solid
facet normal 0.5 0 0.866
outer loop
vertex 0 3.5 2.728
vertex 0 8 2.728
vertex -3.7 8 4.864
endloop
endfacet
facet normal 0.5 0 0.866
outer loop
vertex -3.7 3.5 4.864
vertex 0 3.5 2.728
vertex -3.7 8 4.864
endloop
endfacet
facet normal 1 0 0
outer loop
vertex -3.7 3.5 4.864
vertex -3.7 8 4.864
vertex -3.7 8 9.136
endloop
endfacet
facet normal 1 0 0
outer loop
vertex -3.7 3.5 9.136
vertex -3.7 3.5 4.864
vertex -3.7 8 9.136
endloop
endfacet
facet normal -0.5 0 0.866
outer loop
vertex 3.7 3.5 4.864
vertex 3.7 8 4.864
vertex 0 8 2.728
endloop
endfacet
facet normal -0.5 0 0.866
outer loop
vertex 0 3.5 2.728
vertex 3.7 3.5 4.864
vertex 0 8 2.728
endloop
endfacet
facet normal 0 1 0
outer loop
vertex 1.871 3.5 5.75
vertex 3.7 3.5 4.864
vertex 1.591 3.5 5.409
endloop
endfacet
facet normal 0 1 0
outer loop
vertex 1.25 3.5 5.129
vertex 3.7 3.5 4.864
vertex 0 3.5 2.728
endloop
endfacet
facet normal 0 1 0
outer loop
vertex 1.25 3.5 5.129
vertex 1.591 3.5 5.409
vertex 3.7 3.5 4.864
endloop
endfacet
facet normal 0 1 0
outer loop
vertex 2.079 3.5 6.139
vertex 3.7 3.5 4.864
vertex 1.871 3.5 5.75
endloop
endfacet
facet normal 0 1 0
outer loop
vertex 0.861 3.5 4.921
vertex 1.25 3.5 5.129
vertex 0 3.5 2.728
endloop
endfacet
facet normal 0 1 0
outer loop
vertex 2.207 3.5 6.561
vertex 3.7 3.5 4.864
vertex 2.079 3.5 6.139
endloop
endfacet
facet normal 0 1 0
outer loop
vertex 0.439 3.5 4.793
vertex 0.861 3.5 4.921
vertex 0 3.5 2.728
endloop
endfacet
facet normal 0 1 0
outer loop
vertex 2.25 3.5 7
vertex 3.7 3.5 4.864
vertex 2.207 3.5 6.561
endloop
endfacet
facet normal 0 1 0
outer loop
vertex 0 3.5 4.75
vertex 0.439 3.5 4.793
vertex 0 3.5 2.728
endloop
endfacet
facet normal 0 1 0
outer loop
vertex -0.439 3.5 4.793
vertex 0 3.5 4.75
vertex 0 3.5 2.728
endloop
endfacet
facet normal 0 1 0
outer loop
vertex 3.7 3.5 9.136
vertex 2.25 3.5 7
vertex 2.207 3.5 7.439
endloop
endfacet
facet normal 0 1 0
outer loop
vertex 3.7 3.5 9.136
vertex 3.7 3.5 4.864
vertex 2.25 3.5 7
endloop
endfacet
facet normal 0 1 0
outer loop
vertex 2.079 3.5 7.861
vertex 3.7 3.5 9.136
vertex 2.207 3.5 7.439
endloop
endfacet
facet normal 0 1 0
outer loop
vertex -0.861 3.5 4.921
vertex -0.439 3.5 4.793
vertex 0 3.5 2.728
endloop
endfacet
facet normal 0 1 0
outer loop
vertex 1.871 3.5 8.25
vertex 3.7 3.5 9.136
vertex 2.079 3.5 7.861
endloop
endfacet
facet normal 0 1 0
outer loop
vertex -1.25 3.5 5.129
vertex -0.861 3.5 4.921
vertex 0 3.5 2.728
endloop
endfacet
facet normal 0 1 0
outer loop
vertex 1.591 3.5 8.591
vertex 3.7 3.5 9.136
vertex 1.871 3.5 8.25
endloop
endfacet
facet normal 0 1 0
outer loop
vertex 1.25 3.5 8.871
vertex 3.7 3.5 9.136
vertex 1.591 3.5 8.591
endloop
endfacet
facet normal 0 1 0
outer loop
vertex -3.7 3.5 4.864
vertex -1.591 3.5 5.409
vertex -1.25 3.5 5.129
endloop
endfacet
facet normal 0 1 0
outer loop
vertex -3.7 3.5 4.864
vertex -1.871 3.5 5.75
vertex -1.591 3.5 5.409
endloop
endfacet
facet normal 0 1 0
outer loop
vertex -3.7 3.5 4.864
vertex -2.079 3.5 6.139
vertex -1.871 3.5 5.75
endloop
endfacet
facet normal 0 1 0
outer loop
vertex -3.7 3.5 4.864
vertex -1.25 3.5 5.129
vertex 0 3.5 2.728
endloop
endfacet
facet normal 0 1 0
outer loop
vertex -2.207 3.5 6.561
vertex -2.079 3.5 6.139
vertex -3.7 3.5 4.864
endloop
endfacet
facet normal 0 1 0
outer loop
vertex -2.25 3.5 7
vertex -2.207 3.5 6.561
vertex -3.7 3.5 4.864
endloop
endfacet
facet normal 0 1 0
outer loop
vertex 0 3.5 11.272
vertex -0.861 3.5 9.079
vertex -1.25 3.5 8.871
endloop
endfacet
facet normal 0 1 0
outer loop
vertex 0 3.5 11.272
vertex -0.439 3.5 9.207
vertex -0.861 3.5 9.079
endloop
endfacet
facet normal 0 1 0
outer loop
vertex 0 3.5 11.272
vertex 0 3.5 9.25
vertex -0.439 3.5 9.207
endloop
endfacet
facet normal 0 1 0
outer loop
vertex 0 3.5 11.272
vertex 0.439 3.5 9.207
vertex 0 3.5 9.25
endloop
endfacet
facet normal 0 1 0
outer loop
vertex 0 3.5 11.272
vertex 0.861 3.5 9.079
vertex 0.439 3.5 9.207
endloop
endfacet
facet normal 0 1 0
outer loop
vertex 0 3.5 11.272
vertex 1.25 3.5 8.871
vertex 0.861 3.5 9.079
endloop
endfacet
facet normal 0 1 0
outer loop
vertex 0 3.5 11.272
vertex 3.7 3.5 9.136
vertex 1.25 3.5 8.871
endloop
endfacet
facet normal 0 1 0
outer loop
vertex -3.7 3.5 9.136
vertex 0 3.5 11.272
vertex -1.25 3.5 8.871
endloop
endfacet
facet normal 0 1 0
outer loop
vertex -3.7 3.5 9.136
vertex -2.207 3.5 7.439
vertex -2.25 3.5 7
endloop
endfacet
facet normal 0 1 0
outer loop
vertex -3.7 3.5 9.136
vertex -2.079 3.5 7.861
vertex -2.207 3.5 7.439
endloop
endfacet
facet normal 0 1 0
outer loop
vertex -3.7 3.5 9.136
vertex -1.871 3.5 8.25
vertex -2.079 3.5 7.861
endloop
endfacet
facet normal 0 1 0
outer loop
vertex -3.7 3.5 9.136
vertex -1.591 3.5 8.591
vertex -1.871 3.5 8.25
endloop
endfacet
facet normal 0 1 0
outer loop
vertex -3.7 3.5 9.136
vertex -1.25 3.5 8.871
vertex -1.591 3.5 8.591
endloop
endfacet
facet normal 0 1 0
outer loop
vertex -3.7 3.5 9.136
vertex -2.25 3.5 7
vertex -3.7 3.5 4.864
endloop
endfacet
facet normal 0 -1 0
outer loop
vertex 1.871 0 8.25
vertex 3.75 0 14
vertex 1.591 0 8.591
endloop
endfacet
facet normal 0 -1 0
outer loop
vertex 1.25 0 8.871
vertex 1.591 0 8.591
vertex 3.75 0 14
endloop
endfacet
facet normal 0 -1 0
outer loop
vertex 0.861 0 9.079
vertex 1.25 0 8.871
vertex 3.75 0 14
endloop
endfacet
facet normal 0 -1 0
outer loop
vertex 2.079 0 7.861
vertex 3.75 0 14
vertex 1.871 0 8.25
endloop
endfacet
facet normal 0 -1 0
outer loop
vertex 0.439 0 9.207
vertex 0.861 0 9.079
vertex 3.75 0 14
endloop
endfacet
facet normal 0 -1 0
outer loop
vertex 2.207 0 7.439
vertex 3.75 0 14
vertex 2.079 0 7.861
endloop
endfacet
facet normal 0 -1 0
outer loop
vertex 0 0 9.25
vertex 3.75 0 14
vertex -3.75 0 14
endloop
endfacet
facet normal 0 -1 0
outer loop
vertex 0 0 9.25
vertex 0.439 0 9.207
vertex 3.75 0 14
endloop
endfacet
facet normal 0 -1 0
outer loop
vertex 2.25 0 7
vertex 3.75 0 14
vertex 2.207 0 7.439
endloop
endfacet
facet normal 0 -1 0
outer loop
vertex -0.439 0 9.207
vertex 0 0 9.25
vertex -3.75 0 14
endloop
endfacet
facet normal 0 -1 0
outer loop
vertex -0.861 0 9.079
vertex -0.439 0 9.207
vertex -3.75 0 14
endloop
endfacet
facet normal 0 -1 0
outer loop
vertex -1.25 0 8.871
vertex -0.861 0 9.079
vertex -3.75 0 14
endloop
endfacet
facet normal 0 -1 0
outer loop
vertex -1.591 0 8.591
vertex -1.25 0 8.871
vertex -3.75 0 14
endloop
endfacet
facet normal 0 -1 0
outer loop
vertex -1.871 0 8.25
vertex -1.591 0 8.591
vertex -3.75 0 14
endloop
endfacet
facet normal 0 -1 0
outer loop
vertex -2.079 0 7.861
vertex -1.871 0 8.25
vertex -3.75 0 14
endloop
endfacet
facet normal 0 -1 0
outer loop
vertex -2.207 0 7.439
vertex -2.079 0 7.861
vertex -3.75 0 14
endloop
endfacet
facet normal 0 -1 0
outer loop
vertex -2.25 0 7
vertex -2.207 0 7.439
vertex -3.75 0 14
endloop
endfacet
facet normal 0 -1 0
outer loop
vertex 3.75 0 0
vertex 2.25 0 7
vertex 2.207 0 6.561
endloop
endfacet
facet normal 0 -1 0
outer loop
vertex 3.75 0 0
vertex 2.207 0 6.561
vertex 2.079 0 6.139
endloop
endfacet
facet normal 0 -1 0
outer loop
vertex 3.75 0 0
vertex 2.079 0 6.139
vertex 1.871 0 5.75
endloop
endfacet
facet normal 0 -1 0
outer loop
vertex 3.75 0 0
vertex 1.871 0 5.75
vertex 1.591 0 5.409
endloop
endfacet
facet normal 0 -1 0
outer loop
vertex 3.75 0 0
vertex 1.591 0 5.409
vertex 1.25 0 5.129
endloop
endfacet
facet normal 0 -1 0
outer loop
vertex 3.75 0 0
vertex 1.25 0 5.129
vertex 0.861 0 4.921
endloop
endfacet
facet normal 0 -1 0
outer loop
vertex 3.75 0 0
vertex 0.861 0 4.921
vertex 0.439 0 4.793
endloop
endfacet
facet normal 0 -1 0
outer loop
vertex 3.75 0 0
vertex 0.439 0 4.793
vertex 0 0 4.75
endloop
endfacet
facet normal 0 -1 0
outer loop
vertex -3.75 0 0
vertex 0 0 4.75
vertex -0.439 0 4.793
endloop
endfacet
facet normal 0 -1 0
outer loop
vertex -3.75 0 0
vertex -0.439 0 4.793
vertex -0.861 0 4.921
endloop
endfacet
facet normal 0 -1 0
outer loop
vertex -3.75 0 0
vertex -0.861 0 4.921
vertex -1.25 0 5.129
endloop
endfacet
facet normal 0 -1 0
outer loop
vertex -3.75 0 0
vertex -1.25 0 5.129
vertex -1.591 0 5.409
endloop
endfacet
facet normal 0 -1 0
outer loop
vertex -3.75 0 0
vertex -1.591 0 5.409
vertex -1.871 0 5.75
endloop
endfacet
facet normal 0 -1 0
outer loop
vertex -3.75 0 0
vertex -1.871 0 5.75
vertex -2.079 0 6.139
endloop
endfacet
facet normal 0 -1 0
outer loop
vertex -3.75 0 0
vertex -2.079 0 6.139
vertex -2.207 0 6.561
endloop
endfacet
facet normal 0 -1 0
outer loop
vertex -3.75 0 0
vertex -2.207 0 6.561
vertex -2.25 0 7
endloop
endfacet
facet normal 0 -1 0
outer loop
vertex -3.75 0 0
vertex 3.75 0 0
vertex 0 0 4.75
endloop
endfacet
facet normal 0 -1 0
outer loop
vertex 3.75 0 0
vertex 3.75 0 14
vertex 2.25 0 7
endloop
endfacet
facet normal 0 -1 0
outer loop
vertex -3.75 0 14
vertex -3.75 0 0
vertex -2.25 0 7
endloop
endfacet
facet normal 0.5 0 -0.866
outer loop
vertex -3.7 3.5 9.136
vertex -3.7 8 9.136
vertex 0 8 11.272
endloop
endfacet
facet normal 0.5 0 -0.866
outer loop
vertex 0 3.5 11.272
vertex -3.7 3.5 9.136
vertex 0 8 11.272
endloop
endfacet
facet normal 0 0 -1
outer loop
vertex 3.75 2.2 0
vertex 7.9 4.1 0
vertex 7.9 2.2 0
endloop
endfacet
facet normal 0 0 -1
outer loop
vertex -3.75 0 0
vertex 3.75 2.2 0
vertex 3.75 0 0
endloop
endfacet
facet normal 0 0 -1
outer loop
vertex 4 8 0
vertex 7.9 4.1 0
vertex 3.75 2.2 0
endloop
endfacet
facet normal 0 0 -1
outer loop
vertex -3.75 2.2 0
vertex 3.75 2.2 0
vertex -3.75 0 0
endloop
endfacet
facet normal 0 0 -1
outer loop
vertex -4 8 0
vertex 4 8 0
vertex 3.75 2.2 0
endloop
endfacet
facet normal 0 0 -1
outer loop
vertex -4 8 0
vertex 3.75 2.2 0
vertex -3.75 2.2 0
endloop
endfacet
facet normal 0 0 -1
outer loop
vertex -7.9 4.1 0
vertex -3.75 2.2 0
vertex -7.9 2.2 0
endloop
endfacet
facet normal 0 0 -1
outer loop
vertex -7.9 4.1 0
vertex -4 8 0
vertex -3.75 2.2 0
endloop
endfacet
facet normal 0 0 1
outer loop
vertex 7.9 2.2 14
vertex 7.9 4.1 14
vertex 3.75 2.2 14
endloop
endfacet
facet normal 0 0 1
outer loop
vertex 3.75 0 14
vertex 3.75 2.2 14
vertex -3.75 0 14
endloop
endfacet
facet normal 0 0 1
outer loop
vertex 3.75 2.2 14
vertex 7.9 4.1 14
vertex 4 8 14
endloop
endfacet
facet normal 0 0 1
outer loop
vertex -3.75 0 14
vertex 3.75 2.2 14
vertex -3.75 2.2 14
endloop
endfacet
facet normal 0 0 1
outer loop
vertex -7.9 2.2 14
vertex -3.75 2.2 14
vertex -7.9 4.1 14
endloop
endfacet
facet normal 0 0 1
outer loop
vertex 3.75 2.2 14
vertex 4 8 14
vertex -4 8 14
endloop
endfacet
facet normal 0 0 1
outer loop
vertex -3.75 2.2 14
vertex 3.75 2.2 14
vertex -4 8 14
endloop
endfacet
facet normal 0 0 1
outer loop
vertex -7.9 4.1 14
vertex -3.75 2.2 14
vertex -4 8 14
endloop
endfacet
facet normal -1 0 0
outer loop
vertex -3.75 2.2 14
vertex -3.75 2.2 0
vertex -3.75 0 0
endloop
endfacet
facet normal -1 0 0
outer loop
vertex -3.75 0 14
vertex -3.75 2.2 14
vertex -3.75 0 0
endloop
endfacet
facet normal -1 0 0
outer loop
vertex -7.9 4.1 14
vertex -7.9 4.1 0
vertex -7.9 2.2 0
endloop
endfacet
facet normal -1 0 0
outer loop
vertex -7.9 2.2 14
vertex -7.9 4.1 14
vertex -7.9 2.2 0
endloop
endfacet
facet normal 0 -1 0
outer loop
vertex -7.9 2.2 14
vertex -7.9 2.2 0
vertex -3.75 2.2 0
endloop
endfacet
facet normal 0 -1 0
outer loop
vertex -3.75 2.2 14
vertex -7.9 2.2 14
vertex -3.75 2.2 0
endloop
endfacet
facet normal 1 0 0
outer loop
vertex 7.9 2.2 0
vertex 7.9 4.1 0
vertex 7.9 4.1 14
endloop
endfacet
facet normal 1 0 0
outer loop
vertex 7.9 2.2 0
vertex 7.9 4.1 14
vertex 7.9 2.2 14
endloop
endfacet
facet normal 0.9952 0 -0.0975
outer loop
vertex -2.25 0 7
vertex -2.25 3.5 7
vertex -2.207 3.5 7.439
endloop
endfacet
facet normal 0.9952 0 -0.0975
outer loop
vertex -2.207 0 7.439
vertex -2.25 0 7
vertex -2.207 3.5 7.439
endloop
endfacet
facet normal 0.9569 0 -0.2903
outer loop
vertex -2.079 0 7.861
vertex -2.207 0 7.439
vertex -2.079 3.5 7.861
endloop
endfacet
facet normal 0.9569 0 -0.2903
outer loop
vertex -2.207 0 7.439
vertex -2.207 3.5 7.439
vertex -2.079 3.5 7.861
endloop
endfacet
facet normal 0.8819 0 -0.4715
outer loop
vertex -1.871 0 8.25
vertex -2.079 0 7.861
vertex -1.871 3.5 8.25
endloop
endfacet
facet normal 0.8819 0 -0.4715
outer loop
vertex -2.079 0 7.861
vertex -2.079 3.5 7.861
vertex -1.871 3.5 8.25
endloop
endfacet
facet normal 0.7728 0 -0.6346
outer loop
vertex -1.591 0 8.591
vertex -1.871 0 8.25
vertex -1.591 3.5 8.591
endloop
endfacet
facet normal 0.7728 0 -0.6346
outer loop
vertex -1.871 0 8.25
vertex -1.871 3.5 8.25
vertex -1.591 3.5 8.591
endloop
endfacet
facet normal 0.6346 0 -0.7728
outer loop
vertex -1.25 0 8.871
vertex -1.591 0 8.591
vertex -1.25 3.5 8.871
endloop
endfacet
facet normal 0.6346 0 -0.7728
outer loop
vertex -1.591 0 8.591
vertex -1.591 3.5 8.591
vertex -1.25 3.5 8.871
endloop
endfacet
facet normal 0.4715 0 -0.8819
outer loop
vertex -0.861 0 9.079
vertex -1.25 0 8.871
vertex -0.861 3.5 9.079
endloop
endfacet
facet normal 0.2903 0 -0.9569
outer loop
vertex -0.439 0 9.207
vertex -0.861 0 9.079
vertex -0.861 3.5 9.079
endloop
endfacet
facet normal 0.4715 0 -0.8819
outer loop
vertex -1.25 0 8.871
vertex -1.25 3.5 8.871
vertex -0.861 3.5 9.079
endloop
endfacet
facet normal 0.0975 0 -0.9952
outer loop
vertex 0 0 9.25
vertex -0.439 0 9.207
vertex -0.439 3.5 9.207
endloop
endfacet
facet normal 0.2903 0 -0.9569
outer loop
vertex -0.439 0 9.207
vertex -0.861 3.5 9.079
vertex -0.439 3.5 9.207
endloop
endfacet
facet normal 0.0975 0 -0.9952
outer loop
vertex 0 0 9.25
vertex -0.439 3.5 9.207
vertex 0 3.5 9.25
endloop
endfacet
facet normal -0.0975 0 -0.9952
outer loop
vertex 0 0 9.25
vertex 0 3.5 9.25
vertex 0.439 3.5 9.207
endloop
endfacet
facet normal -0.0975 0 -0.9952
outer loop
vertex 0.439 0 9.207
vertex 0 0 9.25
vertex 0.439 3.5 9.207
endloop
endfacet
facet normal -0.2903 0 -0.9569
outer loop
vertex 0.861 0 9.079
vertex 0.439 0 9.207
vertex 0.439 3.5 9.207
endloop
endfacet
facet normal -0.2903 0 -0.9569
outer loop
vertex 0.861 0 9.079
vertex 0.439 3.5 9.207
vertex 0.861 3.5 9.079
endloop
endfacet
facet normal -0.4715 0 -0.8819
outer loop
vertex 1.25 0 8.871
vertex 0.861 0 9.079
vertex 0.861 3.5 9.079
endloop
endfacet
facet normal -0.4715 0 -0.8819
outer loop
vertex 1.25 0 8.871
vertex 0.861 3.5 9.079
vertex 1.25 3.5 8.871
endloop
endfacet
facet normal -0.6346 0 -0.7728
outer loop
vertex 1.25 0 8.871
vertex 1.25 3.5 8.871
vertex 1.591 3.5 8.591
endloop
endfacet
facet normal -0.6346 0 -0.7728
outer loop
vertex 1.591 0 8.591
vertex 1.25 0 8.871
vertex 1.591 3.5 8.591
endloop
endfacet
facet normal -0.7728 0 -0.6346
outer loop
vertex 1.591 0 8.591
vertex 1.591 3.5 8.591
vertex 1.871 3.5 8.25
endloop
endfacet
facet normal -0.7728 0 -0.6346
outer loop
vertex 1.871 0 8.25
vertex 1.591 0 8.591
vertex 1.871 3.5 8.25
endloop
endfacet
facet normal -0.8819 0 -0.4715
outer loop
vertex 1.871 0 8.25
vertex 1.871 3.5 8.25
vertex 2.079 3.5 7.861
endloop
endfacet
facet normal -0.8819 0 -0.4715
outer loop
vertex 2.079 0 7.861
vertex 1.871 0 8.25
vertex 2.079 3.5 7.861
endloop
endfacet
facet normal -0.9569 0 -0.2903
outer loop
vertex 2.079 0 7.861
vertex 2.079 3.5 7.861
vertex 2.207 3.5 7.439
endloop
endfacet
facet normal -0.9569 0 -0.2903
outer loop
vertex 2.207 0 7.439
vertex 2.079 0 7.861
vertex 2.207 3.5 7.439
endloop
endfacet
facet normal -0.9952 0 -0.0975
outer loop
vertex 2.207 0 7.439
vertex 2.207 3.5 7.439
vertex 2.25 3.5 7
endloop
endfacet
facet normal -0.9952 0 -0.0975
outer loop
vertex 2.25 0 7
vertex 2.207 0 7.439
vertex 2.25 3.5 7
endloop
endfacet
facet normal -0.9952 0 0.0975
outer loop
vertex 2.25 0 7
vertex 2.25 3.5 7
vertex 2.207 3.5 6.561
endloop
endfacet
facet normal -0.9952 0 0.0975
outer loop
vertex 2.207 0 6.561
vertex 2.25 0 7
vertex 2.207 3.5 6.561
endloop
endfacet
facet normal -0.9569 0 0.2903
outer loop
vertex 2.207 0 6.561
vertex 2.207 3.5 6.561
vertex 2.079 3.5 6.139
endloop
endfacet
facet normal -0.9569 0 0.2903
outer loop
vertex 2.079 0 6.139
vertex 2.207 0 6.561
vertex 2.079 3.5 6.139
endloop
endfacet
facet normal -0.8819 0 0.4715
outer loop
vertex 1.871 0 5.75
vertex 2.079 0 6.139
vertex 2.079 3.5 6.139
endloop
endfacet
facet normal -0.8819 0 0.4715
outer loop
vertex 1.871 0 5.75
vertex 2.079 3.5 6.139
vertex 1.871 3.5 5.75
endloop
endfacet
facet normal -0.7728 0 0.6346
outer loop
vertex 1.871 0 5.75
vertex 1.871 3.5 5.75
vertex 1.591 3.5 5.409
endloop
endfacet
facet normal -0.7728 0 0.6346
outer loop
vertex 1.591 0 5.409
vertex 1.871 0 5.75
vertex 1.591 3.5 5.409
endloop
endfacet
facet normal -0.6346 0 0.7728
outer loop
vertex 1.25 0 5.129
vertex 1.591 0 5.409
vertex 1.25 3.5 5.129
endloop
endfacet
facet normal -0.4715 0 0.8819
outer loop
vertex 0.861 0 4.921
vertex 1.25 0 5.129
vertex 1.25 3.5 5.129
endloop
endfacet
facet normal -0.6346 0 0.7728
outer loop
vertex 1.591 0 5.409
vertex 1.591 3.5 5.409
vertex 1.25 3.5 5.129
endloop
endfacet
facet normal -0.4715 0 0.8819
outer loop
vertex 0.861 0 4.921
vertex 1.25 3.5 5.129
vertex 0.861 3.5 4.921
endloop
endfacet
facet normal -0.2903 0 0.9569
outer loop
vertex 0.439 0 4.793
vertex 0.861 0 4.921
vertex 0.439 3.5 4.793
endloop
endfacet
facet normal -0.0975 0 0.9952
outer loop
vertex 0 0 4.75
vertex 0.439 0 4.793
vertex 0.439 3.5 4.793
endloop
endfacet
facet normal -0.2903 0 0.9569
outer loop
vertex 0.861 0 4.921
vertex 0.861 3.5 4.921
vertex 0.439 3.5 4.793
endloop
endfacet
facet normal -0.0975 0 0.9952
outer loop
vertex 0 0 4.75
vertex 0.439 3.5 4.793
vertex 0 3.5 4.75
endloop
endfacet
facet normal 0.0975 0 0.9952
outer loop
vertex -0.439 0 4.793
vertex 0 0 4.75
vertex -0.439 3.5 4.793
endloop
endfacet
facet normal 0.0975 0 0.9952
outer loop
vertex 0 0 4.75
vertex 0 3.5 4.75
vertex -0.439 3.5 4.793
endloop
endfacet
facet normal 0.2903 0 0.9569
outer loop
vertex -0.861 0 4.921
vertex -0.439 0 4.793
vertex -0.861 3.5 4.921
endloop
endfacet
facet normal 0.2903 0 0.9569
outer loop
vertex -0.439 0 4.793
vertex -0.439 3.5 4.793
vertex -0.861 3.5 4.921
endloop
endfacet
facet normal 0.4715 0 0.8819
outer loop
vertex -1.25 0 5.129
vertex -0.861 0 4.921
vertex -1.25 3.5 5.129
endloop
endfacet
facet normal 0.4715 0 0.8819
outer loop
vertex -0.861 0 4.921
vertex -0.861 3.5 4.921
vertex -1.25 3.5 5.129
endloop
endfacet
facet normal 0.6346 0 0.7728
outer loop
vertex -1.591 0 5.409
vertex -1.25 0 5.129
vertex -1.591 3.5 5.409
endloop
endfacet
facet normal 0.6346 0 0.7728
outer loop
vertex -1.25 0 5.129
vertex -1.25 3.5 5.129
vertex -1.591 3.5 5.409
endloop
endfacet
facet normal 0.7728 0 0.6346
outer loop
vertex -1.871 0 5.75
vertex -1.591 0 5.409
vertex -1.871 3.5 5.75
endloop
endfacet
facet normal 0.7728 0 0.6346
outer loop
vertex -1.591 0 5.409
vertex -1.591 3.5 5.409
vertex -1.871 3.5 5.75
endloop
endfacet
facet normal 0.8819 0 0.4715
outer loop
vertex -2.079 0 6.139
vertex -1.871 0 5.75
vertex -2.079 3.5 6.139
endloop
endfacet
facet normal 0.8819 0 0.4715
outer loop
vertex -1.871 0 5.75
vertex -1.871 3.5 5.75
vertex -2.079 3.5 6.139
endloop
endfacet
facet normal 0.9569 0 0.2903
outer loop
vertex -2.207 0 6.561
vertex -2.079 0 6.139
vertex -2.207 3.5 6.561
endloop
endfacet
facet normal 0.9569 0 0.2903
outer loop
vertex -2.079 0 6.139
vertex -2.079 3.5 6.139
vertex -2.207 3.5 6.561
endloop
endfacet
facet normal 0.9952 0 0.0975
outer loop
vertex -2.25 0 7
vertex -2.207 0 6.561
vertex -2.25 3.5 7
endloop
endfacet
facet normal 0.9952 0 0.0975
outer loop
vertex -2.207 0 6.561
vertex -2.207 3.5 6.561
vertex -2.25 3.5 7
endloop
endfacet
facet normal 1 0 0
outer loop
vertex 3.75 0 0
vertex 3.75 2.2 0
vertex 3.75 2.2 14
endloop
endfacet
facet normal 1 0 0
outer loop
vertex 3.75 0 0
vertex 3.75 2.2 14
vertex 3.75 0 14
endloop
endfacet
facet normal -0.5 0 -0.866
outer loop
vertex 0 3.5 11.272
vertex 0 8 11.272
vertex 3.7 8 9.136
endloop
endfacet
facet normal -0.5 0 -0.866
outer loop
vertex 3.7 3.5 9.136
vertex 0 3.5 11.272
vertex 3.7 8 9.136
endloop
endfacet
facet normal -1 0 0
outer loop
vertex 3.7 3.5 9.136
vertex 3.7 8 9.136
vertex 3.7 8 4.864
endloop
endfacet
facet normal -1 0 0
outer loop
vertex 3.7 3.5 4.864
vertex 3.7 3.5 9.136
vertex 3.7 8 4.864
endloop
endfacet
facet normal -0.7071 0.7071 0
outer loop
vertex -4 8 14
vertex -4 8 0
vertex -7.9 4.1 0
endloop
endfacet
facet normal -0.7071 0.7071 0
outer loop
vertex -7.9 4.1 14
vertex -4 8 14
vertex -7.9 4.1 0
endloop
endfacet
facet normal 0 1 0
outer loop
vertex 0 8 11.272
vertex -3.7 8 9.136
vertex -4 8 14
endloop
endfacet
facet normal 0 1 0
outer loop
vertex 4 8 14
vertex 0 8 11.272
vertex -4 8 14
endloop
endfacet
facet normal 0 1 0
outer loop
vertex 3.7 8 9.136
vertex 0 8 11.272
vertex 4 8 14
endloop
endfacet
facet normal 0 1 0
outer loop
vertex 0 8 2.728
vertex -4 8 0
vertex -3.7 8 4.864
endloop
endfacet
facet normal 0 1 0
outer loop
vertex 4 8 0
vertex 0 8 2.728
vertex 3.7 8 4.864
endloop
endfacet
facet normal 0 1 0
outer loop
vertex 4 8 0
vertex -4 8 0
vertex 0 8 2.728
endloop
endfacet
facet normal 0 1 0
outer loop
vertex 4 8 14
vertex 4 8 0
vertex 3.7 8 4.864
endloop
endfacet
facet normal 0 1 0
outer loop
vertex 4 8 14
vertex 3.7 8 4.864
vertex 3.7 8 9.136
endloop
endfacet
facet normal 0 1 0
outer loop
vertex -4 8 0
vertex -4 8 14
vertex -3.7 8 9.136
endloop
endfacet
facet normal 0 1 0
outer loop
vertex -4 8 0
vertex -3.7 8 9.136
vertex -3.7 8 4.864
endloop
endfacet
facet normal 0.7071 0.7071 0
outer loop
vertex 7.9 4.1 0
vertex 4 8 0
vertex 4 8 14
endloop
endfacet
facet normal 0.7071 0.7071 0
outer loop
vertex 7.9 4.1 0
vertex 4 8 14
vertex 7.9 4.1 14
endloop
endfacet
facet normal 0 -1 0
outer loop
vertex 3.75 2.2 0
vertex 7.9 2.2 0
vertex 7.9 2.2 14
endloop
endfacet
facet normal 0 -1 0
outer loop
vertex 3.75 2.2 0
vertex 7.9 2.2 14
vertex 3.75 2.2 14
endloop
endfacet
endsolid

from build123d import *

# Parameters (mm, degrees)
PAD004_DEPTH    = 14
POCKET002_DEPTH = 4.5
SKETCH007_R     = 2.25
HOLE002_DEPTH   = 25


with BuildPart() as part:
    # Sketch009 → Pad004 (new body)
    with BuildSketch(Plane.XY):
        Polygon((0, 0), (0, 8), (-4, 8), (-7.9, 4.1), (-7.9, 2.2), (-3.75, 2.2), (-3.75, 0), align=None)
    pad004 = extrude(amount=PAD004_DEPTH)

    # Mirrored002: Pad004 across Sketch009 V_Axis
    add(pad004.mirror(Plane(origin=(0, 0, 0), x_dir=(0, 0, 1), z_dir=(1, 0, 0))))

    # Sketch008 (on DatumPlane) → Pocket002 (cut)
    with BuildSketch(Plane(origin=(0, 8, 0), x_dir=(-1, 0, 0), z_dir=(0, 1, 0))):
        Polygon((0, 2.727608), (3.7, 4.863804), (3.7, 9.136196), (0, 11.272392), (-3.7, 9.136196), (-3.7, 4.863804), align=None)
    extrude(amount=-POCKET002_DEPTH, mode=Mode.SUBTRACT)

    # Sketch007 (on DatumPlane) → Hole002 (cut)
    with BuildSketch(Plane(origin=(0, 8, 0), x_dir=(-1, 0, 0), z_dir=(0, 1, 0))):
        with Locations((0, 7)):
            Circle(SKETCH007_R)
    extrude(amount=-HOLE002_DEPTH, mode=Mode.SUBTRACT)


solid = part.part
